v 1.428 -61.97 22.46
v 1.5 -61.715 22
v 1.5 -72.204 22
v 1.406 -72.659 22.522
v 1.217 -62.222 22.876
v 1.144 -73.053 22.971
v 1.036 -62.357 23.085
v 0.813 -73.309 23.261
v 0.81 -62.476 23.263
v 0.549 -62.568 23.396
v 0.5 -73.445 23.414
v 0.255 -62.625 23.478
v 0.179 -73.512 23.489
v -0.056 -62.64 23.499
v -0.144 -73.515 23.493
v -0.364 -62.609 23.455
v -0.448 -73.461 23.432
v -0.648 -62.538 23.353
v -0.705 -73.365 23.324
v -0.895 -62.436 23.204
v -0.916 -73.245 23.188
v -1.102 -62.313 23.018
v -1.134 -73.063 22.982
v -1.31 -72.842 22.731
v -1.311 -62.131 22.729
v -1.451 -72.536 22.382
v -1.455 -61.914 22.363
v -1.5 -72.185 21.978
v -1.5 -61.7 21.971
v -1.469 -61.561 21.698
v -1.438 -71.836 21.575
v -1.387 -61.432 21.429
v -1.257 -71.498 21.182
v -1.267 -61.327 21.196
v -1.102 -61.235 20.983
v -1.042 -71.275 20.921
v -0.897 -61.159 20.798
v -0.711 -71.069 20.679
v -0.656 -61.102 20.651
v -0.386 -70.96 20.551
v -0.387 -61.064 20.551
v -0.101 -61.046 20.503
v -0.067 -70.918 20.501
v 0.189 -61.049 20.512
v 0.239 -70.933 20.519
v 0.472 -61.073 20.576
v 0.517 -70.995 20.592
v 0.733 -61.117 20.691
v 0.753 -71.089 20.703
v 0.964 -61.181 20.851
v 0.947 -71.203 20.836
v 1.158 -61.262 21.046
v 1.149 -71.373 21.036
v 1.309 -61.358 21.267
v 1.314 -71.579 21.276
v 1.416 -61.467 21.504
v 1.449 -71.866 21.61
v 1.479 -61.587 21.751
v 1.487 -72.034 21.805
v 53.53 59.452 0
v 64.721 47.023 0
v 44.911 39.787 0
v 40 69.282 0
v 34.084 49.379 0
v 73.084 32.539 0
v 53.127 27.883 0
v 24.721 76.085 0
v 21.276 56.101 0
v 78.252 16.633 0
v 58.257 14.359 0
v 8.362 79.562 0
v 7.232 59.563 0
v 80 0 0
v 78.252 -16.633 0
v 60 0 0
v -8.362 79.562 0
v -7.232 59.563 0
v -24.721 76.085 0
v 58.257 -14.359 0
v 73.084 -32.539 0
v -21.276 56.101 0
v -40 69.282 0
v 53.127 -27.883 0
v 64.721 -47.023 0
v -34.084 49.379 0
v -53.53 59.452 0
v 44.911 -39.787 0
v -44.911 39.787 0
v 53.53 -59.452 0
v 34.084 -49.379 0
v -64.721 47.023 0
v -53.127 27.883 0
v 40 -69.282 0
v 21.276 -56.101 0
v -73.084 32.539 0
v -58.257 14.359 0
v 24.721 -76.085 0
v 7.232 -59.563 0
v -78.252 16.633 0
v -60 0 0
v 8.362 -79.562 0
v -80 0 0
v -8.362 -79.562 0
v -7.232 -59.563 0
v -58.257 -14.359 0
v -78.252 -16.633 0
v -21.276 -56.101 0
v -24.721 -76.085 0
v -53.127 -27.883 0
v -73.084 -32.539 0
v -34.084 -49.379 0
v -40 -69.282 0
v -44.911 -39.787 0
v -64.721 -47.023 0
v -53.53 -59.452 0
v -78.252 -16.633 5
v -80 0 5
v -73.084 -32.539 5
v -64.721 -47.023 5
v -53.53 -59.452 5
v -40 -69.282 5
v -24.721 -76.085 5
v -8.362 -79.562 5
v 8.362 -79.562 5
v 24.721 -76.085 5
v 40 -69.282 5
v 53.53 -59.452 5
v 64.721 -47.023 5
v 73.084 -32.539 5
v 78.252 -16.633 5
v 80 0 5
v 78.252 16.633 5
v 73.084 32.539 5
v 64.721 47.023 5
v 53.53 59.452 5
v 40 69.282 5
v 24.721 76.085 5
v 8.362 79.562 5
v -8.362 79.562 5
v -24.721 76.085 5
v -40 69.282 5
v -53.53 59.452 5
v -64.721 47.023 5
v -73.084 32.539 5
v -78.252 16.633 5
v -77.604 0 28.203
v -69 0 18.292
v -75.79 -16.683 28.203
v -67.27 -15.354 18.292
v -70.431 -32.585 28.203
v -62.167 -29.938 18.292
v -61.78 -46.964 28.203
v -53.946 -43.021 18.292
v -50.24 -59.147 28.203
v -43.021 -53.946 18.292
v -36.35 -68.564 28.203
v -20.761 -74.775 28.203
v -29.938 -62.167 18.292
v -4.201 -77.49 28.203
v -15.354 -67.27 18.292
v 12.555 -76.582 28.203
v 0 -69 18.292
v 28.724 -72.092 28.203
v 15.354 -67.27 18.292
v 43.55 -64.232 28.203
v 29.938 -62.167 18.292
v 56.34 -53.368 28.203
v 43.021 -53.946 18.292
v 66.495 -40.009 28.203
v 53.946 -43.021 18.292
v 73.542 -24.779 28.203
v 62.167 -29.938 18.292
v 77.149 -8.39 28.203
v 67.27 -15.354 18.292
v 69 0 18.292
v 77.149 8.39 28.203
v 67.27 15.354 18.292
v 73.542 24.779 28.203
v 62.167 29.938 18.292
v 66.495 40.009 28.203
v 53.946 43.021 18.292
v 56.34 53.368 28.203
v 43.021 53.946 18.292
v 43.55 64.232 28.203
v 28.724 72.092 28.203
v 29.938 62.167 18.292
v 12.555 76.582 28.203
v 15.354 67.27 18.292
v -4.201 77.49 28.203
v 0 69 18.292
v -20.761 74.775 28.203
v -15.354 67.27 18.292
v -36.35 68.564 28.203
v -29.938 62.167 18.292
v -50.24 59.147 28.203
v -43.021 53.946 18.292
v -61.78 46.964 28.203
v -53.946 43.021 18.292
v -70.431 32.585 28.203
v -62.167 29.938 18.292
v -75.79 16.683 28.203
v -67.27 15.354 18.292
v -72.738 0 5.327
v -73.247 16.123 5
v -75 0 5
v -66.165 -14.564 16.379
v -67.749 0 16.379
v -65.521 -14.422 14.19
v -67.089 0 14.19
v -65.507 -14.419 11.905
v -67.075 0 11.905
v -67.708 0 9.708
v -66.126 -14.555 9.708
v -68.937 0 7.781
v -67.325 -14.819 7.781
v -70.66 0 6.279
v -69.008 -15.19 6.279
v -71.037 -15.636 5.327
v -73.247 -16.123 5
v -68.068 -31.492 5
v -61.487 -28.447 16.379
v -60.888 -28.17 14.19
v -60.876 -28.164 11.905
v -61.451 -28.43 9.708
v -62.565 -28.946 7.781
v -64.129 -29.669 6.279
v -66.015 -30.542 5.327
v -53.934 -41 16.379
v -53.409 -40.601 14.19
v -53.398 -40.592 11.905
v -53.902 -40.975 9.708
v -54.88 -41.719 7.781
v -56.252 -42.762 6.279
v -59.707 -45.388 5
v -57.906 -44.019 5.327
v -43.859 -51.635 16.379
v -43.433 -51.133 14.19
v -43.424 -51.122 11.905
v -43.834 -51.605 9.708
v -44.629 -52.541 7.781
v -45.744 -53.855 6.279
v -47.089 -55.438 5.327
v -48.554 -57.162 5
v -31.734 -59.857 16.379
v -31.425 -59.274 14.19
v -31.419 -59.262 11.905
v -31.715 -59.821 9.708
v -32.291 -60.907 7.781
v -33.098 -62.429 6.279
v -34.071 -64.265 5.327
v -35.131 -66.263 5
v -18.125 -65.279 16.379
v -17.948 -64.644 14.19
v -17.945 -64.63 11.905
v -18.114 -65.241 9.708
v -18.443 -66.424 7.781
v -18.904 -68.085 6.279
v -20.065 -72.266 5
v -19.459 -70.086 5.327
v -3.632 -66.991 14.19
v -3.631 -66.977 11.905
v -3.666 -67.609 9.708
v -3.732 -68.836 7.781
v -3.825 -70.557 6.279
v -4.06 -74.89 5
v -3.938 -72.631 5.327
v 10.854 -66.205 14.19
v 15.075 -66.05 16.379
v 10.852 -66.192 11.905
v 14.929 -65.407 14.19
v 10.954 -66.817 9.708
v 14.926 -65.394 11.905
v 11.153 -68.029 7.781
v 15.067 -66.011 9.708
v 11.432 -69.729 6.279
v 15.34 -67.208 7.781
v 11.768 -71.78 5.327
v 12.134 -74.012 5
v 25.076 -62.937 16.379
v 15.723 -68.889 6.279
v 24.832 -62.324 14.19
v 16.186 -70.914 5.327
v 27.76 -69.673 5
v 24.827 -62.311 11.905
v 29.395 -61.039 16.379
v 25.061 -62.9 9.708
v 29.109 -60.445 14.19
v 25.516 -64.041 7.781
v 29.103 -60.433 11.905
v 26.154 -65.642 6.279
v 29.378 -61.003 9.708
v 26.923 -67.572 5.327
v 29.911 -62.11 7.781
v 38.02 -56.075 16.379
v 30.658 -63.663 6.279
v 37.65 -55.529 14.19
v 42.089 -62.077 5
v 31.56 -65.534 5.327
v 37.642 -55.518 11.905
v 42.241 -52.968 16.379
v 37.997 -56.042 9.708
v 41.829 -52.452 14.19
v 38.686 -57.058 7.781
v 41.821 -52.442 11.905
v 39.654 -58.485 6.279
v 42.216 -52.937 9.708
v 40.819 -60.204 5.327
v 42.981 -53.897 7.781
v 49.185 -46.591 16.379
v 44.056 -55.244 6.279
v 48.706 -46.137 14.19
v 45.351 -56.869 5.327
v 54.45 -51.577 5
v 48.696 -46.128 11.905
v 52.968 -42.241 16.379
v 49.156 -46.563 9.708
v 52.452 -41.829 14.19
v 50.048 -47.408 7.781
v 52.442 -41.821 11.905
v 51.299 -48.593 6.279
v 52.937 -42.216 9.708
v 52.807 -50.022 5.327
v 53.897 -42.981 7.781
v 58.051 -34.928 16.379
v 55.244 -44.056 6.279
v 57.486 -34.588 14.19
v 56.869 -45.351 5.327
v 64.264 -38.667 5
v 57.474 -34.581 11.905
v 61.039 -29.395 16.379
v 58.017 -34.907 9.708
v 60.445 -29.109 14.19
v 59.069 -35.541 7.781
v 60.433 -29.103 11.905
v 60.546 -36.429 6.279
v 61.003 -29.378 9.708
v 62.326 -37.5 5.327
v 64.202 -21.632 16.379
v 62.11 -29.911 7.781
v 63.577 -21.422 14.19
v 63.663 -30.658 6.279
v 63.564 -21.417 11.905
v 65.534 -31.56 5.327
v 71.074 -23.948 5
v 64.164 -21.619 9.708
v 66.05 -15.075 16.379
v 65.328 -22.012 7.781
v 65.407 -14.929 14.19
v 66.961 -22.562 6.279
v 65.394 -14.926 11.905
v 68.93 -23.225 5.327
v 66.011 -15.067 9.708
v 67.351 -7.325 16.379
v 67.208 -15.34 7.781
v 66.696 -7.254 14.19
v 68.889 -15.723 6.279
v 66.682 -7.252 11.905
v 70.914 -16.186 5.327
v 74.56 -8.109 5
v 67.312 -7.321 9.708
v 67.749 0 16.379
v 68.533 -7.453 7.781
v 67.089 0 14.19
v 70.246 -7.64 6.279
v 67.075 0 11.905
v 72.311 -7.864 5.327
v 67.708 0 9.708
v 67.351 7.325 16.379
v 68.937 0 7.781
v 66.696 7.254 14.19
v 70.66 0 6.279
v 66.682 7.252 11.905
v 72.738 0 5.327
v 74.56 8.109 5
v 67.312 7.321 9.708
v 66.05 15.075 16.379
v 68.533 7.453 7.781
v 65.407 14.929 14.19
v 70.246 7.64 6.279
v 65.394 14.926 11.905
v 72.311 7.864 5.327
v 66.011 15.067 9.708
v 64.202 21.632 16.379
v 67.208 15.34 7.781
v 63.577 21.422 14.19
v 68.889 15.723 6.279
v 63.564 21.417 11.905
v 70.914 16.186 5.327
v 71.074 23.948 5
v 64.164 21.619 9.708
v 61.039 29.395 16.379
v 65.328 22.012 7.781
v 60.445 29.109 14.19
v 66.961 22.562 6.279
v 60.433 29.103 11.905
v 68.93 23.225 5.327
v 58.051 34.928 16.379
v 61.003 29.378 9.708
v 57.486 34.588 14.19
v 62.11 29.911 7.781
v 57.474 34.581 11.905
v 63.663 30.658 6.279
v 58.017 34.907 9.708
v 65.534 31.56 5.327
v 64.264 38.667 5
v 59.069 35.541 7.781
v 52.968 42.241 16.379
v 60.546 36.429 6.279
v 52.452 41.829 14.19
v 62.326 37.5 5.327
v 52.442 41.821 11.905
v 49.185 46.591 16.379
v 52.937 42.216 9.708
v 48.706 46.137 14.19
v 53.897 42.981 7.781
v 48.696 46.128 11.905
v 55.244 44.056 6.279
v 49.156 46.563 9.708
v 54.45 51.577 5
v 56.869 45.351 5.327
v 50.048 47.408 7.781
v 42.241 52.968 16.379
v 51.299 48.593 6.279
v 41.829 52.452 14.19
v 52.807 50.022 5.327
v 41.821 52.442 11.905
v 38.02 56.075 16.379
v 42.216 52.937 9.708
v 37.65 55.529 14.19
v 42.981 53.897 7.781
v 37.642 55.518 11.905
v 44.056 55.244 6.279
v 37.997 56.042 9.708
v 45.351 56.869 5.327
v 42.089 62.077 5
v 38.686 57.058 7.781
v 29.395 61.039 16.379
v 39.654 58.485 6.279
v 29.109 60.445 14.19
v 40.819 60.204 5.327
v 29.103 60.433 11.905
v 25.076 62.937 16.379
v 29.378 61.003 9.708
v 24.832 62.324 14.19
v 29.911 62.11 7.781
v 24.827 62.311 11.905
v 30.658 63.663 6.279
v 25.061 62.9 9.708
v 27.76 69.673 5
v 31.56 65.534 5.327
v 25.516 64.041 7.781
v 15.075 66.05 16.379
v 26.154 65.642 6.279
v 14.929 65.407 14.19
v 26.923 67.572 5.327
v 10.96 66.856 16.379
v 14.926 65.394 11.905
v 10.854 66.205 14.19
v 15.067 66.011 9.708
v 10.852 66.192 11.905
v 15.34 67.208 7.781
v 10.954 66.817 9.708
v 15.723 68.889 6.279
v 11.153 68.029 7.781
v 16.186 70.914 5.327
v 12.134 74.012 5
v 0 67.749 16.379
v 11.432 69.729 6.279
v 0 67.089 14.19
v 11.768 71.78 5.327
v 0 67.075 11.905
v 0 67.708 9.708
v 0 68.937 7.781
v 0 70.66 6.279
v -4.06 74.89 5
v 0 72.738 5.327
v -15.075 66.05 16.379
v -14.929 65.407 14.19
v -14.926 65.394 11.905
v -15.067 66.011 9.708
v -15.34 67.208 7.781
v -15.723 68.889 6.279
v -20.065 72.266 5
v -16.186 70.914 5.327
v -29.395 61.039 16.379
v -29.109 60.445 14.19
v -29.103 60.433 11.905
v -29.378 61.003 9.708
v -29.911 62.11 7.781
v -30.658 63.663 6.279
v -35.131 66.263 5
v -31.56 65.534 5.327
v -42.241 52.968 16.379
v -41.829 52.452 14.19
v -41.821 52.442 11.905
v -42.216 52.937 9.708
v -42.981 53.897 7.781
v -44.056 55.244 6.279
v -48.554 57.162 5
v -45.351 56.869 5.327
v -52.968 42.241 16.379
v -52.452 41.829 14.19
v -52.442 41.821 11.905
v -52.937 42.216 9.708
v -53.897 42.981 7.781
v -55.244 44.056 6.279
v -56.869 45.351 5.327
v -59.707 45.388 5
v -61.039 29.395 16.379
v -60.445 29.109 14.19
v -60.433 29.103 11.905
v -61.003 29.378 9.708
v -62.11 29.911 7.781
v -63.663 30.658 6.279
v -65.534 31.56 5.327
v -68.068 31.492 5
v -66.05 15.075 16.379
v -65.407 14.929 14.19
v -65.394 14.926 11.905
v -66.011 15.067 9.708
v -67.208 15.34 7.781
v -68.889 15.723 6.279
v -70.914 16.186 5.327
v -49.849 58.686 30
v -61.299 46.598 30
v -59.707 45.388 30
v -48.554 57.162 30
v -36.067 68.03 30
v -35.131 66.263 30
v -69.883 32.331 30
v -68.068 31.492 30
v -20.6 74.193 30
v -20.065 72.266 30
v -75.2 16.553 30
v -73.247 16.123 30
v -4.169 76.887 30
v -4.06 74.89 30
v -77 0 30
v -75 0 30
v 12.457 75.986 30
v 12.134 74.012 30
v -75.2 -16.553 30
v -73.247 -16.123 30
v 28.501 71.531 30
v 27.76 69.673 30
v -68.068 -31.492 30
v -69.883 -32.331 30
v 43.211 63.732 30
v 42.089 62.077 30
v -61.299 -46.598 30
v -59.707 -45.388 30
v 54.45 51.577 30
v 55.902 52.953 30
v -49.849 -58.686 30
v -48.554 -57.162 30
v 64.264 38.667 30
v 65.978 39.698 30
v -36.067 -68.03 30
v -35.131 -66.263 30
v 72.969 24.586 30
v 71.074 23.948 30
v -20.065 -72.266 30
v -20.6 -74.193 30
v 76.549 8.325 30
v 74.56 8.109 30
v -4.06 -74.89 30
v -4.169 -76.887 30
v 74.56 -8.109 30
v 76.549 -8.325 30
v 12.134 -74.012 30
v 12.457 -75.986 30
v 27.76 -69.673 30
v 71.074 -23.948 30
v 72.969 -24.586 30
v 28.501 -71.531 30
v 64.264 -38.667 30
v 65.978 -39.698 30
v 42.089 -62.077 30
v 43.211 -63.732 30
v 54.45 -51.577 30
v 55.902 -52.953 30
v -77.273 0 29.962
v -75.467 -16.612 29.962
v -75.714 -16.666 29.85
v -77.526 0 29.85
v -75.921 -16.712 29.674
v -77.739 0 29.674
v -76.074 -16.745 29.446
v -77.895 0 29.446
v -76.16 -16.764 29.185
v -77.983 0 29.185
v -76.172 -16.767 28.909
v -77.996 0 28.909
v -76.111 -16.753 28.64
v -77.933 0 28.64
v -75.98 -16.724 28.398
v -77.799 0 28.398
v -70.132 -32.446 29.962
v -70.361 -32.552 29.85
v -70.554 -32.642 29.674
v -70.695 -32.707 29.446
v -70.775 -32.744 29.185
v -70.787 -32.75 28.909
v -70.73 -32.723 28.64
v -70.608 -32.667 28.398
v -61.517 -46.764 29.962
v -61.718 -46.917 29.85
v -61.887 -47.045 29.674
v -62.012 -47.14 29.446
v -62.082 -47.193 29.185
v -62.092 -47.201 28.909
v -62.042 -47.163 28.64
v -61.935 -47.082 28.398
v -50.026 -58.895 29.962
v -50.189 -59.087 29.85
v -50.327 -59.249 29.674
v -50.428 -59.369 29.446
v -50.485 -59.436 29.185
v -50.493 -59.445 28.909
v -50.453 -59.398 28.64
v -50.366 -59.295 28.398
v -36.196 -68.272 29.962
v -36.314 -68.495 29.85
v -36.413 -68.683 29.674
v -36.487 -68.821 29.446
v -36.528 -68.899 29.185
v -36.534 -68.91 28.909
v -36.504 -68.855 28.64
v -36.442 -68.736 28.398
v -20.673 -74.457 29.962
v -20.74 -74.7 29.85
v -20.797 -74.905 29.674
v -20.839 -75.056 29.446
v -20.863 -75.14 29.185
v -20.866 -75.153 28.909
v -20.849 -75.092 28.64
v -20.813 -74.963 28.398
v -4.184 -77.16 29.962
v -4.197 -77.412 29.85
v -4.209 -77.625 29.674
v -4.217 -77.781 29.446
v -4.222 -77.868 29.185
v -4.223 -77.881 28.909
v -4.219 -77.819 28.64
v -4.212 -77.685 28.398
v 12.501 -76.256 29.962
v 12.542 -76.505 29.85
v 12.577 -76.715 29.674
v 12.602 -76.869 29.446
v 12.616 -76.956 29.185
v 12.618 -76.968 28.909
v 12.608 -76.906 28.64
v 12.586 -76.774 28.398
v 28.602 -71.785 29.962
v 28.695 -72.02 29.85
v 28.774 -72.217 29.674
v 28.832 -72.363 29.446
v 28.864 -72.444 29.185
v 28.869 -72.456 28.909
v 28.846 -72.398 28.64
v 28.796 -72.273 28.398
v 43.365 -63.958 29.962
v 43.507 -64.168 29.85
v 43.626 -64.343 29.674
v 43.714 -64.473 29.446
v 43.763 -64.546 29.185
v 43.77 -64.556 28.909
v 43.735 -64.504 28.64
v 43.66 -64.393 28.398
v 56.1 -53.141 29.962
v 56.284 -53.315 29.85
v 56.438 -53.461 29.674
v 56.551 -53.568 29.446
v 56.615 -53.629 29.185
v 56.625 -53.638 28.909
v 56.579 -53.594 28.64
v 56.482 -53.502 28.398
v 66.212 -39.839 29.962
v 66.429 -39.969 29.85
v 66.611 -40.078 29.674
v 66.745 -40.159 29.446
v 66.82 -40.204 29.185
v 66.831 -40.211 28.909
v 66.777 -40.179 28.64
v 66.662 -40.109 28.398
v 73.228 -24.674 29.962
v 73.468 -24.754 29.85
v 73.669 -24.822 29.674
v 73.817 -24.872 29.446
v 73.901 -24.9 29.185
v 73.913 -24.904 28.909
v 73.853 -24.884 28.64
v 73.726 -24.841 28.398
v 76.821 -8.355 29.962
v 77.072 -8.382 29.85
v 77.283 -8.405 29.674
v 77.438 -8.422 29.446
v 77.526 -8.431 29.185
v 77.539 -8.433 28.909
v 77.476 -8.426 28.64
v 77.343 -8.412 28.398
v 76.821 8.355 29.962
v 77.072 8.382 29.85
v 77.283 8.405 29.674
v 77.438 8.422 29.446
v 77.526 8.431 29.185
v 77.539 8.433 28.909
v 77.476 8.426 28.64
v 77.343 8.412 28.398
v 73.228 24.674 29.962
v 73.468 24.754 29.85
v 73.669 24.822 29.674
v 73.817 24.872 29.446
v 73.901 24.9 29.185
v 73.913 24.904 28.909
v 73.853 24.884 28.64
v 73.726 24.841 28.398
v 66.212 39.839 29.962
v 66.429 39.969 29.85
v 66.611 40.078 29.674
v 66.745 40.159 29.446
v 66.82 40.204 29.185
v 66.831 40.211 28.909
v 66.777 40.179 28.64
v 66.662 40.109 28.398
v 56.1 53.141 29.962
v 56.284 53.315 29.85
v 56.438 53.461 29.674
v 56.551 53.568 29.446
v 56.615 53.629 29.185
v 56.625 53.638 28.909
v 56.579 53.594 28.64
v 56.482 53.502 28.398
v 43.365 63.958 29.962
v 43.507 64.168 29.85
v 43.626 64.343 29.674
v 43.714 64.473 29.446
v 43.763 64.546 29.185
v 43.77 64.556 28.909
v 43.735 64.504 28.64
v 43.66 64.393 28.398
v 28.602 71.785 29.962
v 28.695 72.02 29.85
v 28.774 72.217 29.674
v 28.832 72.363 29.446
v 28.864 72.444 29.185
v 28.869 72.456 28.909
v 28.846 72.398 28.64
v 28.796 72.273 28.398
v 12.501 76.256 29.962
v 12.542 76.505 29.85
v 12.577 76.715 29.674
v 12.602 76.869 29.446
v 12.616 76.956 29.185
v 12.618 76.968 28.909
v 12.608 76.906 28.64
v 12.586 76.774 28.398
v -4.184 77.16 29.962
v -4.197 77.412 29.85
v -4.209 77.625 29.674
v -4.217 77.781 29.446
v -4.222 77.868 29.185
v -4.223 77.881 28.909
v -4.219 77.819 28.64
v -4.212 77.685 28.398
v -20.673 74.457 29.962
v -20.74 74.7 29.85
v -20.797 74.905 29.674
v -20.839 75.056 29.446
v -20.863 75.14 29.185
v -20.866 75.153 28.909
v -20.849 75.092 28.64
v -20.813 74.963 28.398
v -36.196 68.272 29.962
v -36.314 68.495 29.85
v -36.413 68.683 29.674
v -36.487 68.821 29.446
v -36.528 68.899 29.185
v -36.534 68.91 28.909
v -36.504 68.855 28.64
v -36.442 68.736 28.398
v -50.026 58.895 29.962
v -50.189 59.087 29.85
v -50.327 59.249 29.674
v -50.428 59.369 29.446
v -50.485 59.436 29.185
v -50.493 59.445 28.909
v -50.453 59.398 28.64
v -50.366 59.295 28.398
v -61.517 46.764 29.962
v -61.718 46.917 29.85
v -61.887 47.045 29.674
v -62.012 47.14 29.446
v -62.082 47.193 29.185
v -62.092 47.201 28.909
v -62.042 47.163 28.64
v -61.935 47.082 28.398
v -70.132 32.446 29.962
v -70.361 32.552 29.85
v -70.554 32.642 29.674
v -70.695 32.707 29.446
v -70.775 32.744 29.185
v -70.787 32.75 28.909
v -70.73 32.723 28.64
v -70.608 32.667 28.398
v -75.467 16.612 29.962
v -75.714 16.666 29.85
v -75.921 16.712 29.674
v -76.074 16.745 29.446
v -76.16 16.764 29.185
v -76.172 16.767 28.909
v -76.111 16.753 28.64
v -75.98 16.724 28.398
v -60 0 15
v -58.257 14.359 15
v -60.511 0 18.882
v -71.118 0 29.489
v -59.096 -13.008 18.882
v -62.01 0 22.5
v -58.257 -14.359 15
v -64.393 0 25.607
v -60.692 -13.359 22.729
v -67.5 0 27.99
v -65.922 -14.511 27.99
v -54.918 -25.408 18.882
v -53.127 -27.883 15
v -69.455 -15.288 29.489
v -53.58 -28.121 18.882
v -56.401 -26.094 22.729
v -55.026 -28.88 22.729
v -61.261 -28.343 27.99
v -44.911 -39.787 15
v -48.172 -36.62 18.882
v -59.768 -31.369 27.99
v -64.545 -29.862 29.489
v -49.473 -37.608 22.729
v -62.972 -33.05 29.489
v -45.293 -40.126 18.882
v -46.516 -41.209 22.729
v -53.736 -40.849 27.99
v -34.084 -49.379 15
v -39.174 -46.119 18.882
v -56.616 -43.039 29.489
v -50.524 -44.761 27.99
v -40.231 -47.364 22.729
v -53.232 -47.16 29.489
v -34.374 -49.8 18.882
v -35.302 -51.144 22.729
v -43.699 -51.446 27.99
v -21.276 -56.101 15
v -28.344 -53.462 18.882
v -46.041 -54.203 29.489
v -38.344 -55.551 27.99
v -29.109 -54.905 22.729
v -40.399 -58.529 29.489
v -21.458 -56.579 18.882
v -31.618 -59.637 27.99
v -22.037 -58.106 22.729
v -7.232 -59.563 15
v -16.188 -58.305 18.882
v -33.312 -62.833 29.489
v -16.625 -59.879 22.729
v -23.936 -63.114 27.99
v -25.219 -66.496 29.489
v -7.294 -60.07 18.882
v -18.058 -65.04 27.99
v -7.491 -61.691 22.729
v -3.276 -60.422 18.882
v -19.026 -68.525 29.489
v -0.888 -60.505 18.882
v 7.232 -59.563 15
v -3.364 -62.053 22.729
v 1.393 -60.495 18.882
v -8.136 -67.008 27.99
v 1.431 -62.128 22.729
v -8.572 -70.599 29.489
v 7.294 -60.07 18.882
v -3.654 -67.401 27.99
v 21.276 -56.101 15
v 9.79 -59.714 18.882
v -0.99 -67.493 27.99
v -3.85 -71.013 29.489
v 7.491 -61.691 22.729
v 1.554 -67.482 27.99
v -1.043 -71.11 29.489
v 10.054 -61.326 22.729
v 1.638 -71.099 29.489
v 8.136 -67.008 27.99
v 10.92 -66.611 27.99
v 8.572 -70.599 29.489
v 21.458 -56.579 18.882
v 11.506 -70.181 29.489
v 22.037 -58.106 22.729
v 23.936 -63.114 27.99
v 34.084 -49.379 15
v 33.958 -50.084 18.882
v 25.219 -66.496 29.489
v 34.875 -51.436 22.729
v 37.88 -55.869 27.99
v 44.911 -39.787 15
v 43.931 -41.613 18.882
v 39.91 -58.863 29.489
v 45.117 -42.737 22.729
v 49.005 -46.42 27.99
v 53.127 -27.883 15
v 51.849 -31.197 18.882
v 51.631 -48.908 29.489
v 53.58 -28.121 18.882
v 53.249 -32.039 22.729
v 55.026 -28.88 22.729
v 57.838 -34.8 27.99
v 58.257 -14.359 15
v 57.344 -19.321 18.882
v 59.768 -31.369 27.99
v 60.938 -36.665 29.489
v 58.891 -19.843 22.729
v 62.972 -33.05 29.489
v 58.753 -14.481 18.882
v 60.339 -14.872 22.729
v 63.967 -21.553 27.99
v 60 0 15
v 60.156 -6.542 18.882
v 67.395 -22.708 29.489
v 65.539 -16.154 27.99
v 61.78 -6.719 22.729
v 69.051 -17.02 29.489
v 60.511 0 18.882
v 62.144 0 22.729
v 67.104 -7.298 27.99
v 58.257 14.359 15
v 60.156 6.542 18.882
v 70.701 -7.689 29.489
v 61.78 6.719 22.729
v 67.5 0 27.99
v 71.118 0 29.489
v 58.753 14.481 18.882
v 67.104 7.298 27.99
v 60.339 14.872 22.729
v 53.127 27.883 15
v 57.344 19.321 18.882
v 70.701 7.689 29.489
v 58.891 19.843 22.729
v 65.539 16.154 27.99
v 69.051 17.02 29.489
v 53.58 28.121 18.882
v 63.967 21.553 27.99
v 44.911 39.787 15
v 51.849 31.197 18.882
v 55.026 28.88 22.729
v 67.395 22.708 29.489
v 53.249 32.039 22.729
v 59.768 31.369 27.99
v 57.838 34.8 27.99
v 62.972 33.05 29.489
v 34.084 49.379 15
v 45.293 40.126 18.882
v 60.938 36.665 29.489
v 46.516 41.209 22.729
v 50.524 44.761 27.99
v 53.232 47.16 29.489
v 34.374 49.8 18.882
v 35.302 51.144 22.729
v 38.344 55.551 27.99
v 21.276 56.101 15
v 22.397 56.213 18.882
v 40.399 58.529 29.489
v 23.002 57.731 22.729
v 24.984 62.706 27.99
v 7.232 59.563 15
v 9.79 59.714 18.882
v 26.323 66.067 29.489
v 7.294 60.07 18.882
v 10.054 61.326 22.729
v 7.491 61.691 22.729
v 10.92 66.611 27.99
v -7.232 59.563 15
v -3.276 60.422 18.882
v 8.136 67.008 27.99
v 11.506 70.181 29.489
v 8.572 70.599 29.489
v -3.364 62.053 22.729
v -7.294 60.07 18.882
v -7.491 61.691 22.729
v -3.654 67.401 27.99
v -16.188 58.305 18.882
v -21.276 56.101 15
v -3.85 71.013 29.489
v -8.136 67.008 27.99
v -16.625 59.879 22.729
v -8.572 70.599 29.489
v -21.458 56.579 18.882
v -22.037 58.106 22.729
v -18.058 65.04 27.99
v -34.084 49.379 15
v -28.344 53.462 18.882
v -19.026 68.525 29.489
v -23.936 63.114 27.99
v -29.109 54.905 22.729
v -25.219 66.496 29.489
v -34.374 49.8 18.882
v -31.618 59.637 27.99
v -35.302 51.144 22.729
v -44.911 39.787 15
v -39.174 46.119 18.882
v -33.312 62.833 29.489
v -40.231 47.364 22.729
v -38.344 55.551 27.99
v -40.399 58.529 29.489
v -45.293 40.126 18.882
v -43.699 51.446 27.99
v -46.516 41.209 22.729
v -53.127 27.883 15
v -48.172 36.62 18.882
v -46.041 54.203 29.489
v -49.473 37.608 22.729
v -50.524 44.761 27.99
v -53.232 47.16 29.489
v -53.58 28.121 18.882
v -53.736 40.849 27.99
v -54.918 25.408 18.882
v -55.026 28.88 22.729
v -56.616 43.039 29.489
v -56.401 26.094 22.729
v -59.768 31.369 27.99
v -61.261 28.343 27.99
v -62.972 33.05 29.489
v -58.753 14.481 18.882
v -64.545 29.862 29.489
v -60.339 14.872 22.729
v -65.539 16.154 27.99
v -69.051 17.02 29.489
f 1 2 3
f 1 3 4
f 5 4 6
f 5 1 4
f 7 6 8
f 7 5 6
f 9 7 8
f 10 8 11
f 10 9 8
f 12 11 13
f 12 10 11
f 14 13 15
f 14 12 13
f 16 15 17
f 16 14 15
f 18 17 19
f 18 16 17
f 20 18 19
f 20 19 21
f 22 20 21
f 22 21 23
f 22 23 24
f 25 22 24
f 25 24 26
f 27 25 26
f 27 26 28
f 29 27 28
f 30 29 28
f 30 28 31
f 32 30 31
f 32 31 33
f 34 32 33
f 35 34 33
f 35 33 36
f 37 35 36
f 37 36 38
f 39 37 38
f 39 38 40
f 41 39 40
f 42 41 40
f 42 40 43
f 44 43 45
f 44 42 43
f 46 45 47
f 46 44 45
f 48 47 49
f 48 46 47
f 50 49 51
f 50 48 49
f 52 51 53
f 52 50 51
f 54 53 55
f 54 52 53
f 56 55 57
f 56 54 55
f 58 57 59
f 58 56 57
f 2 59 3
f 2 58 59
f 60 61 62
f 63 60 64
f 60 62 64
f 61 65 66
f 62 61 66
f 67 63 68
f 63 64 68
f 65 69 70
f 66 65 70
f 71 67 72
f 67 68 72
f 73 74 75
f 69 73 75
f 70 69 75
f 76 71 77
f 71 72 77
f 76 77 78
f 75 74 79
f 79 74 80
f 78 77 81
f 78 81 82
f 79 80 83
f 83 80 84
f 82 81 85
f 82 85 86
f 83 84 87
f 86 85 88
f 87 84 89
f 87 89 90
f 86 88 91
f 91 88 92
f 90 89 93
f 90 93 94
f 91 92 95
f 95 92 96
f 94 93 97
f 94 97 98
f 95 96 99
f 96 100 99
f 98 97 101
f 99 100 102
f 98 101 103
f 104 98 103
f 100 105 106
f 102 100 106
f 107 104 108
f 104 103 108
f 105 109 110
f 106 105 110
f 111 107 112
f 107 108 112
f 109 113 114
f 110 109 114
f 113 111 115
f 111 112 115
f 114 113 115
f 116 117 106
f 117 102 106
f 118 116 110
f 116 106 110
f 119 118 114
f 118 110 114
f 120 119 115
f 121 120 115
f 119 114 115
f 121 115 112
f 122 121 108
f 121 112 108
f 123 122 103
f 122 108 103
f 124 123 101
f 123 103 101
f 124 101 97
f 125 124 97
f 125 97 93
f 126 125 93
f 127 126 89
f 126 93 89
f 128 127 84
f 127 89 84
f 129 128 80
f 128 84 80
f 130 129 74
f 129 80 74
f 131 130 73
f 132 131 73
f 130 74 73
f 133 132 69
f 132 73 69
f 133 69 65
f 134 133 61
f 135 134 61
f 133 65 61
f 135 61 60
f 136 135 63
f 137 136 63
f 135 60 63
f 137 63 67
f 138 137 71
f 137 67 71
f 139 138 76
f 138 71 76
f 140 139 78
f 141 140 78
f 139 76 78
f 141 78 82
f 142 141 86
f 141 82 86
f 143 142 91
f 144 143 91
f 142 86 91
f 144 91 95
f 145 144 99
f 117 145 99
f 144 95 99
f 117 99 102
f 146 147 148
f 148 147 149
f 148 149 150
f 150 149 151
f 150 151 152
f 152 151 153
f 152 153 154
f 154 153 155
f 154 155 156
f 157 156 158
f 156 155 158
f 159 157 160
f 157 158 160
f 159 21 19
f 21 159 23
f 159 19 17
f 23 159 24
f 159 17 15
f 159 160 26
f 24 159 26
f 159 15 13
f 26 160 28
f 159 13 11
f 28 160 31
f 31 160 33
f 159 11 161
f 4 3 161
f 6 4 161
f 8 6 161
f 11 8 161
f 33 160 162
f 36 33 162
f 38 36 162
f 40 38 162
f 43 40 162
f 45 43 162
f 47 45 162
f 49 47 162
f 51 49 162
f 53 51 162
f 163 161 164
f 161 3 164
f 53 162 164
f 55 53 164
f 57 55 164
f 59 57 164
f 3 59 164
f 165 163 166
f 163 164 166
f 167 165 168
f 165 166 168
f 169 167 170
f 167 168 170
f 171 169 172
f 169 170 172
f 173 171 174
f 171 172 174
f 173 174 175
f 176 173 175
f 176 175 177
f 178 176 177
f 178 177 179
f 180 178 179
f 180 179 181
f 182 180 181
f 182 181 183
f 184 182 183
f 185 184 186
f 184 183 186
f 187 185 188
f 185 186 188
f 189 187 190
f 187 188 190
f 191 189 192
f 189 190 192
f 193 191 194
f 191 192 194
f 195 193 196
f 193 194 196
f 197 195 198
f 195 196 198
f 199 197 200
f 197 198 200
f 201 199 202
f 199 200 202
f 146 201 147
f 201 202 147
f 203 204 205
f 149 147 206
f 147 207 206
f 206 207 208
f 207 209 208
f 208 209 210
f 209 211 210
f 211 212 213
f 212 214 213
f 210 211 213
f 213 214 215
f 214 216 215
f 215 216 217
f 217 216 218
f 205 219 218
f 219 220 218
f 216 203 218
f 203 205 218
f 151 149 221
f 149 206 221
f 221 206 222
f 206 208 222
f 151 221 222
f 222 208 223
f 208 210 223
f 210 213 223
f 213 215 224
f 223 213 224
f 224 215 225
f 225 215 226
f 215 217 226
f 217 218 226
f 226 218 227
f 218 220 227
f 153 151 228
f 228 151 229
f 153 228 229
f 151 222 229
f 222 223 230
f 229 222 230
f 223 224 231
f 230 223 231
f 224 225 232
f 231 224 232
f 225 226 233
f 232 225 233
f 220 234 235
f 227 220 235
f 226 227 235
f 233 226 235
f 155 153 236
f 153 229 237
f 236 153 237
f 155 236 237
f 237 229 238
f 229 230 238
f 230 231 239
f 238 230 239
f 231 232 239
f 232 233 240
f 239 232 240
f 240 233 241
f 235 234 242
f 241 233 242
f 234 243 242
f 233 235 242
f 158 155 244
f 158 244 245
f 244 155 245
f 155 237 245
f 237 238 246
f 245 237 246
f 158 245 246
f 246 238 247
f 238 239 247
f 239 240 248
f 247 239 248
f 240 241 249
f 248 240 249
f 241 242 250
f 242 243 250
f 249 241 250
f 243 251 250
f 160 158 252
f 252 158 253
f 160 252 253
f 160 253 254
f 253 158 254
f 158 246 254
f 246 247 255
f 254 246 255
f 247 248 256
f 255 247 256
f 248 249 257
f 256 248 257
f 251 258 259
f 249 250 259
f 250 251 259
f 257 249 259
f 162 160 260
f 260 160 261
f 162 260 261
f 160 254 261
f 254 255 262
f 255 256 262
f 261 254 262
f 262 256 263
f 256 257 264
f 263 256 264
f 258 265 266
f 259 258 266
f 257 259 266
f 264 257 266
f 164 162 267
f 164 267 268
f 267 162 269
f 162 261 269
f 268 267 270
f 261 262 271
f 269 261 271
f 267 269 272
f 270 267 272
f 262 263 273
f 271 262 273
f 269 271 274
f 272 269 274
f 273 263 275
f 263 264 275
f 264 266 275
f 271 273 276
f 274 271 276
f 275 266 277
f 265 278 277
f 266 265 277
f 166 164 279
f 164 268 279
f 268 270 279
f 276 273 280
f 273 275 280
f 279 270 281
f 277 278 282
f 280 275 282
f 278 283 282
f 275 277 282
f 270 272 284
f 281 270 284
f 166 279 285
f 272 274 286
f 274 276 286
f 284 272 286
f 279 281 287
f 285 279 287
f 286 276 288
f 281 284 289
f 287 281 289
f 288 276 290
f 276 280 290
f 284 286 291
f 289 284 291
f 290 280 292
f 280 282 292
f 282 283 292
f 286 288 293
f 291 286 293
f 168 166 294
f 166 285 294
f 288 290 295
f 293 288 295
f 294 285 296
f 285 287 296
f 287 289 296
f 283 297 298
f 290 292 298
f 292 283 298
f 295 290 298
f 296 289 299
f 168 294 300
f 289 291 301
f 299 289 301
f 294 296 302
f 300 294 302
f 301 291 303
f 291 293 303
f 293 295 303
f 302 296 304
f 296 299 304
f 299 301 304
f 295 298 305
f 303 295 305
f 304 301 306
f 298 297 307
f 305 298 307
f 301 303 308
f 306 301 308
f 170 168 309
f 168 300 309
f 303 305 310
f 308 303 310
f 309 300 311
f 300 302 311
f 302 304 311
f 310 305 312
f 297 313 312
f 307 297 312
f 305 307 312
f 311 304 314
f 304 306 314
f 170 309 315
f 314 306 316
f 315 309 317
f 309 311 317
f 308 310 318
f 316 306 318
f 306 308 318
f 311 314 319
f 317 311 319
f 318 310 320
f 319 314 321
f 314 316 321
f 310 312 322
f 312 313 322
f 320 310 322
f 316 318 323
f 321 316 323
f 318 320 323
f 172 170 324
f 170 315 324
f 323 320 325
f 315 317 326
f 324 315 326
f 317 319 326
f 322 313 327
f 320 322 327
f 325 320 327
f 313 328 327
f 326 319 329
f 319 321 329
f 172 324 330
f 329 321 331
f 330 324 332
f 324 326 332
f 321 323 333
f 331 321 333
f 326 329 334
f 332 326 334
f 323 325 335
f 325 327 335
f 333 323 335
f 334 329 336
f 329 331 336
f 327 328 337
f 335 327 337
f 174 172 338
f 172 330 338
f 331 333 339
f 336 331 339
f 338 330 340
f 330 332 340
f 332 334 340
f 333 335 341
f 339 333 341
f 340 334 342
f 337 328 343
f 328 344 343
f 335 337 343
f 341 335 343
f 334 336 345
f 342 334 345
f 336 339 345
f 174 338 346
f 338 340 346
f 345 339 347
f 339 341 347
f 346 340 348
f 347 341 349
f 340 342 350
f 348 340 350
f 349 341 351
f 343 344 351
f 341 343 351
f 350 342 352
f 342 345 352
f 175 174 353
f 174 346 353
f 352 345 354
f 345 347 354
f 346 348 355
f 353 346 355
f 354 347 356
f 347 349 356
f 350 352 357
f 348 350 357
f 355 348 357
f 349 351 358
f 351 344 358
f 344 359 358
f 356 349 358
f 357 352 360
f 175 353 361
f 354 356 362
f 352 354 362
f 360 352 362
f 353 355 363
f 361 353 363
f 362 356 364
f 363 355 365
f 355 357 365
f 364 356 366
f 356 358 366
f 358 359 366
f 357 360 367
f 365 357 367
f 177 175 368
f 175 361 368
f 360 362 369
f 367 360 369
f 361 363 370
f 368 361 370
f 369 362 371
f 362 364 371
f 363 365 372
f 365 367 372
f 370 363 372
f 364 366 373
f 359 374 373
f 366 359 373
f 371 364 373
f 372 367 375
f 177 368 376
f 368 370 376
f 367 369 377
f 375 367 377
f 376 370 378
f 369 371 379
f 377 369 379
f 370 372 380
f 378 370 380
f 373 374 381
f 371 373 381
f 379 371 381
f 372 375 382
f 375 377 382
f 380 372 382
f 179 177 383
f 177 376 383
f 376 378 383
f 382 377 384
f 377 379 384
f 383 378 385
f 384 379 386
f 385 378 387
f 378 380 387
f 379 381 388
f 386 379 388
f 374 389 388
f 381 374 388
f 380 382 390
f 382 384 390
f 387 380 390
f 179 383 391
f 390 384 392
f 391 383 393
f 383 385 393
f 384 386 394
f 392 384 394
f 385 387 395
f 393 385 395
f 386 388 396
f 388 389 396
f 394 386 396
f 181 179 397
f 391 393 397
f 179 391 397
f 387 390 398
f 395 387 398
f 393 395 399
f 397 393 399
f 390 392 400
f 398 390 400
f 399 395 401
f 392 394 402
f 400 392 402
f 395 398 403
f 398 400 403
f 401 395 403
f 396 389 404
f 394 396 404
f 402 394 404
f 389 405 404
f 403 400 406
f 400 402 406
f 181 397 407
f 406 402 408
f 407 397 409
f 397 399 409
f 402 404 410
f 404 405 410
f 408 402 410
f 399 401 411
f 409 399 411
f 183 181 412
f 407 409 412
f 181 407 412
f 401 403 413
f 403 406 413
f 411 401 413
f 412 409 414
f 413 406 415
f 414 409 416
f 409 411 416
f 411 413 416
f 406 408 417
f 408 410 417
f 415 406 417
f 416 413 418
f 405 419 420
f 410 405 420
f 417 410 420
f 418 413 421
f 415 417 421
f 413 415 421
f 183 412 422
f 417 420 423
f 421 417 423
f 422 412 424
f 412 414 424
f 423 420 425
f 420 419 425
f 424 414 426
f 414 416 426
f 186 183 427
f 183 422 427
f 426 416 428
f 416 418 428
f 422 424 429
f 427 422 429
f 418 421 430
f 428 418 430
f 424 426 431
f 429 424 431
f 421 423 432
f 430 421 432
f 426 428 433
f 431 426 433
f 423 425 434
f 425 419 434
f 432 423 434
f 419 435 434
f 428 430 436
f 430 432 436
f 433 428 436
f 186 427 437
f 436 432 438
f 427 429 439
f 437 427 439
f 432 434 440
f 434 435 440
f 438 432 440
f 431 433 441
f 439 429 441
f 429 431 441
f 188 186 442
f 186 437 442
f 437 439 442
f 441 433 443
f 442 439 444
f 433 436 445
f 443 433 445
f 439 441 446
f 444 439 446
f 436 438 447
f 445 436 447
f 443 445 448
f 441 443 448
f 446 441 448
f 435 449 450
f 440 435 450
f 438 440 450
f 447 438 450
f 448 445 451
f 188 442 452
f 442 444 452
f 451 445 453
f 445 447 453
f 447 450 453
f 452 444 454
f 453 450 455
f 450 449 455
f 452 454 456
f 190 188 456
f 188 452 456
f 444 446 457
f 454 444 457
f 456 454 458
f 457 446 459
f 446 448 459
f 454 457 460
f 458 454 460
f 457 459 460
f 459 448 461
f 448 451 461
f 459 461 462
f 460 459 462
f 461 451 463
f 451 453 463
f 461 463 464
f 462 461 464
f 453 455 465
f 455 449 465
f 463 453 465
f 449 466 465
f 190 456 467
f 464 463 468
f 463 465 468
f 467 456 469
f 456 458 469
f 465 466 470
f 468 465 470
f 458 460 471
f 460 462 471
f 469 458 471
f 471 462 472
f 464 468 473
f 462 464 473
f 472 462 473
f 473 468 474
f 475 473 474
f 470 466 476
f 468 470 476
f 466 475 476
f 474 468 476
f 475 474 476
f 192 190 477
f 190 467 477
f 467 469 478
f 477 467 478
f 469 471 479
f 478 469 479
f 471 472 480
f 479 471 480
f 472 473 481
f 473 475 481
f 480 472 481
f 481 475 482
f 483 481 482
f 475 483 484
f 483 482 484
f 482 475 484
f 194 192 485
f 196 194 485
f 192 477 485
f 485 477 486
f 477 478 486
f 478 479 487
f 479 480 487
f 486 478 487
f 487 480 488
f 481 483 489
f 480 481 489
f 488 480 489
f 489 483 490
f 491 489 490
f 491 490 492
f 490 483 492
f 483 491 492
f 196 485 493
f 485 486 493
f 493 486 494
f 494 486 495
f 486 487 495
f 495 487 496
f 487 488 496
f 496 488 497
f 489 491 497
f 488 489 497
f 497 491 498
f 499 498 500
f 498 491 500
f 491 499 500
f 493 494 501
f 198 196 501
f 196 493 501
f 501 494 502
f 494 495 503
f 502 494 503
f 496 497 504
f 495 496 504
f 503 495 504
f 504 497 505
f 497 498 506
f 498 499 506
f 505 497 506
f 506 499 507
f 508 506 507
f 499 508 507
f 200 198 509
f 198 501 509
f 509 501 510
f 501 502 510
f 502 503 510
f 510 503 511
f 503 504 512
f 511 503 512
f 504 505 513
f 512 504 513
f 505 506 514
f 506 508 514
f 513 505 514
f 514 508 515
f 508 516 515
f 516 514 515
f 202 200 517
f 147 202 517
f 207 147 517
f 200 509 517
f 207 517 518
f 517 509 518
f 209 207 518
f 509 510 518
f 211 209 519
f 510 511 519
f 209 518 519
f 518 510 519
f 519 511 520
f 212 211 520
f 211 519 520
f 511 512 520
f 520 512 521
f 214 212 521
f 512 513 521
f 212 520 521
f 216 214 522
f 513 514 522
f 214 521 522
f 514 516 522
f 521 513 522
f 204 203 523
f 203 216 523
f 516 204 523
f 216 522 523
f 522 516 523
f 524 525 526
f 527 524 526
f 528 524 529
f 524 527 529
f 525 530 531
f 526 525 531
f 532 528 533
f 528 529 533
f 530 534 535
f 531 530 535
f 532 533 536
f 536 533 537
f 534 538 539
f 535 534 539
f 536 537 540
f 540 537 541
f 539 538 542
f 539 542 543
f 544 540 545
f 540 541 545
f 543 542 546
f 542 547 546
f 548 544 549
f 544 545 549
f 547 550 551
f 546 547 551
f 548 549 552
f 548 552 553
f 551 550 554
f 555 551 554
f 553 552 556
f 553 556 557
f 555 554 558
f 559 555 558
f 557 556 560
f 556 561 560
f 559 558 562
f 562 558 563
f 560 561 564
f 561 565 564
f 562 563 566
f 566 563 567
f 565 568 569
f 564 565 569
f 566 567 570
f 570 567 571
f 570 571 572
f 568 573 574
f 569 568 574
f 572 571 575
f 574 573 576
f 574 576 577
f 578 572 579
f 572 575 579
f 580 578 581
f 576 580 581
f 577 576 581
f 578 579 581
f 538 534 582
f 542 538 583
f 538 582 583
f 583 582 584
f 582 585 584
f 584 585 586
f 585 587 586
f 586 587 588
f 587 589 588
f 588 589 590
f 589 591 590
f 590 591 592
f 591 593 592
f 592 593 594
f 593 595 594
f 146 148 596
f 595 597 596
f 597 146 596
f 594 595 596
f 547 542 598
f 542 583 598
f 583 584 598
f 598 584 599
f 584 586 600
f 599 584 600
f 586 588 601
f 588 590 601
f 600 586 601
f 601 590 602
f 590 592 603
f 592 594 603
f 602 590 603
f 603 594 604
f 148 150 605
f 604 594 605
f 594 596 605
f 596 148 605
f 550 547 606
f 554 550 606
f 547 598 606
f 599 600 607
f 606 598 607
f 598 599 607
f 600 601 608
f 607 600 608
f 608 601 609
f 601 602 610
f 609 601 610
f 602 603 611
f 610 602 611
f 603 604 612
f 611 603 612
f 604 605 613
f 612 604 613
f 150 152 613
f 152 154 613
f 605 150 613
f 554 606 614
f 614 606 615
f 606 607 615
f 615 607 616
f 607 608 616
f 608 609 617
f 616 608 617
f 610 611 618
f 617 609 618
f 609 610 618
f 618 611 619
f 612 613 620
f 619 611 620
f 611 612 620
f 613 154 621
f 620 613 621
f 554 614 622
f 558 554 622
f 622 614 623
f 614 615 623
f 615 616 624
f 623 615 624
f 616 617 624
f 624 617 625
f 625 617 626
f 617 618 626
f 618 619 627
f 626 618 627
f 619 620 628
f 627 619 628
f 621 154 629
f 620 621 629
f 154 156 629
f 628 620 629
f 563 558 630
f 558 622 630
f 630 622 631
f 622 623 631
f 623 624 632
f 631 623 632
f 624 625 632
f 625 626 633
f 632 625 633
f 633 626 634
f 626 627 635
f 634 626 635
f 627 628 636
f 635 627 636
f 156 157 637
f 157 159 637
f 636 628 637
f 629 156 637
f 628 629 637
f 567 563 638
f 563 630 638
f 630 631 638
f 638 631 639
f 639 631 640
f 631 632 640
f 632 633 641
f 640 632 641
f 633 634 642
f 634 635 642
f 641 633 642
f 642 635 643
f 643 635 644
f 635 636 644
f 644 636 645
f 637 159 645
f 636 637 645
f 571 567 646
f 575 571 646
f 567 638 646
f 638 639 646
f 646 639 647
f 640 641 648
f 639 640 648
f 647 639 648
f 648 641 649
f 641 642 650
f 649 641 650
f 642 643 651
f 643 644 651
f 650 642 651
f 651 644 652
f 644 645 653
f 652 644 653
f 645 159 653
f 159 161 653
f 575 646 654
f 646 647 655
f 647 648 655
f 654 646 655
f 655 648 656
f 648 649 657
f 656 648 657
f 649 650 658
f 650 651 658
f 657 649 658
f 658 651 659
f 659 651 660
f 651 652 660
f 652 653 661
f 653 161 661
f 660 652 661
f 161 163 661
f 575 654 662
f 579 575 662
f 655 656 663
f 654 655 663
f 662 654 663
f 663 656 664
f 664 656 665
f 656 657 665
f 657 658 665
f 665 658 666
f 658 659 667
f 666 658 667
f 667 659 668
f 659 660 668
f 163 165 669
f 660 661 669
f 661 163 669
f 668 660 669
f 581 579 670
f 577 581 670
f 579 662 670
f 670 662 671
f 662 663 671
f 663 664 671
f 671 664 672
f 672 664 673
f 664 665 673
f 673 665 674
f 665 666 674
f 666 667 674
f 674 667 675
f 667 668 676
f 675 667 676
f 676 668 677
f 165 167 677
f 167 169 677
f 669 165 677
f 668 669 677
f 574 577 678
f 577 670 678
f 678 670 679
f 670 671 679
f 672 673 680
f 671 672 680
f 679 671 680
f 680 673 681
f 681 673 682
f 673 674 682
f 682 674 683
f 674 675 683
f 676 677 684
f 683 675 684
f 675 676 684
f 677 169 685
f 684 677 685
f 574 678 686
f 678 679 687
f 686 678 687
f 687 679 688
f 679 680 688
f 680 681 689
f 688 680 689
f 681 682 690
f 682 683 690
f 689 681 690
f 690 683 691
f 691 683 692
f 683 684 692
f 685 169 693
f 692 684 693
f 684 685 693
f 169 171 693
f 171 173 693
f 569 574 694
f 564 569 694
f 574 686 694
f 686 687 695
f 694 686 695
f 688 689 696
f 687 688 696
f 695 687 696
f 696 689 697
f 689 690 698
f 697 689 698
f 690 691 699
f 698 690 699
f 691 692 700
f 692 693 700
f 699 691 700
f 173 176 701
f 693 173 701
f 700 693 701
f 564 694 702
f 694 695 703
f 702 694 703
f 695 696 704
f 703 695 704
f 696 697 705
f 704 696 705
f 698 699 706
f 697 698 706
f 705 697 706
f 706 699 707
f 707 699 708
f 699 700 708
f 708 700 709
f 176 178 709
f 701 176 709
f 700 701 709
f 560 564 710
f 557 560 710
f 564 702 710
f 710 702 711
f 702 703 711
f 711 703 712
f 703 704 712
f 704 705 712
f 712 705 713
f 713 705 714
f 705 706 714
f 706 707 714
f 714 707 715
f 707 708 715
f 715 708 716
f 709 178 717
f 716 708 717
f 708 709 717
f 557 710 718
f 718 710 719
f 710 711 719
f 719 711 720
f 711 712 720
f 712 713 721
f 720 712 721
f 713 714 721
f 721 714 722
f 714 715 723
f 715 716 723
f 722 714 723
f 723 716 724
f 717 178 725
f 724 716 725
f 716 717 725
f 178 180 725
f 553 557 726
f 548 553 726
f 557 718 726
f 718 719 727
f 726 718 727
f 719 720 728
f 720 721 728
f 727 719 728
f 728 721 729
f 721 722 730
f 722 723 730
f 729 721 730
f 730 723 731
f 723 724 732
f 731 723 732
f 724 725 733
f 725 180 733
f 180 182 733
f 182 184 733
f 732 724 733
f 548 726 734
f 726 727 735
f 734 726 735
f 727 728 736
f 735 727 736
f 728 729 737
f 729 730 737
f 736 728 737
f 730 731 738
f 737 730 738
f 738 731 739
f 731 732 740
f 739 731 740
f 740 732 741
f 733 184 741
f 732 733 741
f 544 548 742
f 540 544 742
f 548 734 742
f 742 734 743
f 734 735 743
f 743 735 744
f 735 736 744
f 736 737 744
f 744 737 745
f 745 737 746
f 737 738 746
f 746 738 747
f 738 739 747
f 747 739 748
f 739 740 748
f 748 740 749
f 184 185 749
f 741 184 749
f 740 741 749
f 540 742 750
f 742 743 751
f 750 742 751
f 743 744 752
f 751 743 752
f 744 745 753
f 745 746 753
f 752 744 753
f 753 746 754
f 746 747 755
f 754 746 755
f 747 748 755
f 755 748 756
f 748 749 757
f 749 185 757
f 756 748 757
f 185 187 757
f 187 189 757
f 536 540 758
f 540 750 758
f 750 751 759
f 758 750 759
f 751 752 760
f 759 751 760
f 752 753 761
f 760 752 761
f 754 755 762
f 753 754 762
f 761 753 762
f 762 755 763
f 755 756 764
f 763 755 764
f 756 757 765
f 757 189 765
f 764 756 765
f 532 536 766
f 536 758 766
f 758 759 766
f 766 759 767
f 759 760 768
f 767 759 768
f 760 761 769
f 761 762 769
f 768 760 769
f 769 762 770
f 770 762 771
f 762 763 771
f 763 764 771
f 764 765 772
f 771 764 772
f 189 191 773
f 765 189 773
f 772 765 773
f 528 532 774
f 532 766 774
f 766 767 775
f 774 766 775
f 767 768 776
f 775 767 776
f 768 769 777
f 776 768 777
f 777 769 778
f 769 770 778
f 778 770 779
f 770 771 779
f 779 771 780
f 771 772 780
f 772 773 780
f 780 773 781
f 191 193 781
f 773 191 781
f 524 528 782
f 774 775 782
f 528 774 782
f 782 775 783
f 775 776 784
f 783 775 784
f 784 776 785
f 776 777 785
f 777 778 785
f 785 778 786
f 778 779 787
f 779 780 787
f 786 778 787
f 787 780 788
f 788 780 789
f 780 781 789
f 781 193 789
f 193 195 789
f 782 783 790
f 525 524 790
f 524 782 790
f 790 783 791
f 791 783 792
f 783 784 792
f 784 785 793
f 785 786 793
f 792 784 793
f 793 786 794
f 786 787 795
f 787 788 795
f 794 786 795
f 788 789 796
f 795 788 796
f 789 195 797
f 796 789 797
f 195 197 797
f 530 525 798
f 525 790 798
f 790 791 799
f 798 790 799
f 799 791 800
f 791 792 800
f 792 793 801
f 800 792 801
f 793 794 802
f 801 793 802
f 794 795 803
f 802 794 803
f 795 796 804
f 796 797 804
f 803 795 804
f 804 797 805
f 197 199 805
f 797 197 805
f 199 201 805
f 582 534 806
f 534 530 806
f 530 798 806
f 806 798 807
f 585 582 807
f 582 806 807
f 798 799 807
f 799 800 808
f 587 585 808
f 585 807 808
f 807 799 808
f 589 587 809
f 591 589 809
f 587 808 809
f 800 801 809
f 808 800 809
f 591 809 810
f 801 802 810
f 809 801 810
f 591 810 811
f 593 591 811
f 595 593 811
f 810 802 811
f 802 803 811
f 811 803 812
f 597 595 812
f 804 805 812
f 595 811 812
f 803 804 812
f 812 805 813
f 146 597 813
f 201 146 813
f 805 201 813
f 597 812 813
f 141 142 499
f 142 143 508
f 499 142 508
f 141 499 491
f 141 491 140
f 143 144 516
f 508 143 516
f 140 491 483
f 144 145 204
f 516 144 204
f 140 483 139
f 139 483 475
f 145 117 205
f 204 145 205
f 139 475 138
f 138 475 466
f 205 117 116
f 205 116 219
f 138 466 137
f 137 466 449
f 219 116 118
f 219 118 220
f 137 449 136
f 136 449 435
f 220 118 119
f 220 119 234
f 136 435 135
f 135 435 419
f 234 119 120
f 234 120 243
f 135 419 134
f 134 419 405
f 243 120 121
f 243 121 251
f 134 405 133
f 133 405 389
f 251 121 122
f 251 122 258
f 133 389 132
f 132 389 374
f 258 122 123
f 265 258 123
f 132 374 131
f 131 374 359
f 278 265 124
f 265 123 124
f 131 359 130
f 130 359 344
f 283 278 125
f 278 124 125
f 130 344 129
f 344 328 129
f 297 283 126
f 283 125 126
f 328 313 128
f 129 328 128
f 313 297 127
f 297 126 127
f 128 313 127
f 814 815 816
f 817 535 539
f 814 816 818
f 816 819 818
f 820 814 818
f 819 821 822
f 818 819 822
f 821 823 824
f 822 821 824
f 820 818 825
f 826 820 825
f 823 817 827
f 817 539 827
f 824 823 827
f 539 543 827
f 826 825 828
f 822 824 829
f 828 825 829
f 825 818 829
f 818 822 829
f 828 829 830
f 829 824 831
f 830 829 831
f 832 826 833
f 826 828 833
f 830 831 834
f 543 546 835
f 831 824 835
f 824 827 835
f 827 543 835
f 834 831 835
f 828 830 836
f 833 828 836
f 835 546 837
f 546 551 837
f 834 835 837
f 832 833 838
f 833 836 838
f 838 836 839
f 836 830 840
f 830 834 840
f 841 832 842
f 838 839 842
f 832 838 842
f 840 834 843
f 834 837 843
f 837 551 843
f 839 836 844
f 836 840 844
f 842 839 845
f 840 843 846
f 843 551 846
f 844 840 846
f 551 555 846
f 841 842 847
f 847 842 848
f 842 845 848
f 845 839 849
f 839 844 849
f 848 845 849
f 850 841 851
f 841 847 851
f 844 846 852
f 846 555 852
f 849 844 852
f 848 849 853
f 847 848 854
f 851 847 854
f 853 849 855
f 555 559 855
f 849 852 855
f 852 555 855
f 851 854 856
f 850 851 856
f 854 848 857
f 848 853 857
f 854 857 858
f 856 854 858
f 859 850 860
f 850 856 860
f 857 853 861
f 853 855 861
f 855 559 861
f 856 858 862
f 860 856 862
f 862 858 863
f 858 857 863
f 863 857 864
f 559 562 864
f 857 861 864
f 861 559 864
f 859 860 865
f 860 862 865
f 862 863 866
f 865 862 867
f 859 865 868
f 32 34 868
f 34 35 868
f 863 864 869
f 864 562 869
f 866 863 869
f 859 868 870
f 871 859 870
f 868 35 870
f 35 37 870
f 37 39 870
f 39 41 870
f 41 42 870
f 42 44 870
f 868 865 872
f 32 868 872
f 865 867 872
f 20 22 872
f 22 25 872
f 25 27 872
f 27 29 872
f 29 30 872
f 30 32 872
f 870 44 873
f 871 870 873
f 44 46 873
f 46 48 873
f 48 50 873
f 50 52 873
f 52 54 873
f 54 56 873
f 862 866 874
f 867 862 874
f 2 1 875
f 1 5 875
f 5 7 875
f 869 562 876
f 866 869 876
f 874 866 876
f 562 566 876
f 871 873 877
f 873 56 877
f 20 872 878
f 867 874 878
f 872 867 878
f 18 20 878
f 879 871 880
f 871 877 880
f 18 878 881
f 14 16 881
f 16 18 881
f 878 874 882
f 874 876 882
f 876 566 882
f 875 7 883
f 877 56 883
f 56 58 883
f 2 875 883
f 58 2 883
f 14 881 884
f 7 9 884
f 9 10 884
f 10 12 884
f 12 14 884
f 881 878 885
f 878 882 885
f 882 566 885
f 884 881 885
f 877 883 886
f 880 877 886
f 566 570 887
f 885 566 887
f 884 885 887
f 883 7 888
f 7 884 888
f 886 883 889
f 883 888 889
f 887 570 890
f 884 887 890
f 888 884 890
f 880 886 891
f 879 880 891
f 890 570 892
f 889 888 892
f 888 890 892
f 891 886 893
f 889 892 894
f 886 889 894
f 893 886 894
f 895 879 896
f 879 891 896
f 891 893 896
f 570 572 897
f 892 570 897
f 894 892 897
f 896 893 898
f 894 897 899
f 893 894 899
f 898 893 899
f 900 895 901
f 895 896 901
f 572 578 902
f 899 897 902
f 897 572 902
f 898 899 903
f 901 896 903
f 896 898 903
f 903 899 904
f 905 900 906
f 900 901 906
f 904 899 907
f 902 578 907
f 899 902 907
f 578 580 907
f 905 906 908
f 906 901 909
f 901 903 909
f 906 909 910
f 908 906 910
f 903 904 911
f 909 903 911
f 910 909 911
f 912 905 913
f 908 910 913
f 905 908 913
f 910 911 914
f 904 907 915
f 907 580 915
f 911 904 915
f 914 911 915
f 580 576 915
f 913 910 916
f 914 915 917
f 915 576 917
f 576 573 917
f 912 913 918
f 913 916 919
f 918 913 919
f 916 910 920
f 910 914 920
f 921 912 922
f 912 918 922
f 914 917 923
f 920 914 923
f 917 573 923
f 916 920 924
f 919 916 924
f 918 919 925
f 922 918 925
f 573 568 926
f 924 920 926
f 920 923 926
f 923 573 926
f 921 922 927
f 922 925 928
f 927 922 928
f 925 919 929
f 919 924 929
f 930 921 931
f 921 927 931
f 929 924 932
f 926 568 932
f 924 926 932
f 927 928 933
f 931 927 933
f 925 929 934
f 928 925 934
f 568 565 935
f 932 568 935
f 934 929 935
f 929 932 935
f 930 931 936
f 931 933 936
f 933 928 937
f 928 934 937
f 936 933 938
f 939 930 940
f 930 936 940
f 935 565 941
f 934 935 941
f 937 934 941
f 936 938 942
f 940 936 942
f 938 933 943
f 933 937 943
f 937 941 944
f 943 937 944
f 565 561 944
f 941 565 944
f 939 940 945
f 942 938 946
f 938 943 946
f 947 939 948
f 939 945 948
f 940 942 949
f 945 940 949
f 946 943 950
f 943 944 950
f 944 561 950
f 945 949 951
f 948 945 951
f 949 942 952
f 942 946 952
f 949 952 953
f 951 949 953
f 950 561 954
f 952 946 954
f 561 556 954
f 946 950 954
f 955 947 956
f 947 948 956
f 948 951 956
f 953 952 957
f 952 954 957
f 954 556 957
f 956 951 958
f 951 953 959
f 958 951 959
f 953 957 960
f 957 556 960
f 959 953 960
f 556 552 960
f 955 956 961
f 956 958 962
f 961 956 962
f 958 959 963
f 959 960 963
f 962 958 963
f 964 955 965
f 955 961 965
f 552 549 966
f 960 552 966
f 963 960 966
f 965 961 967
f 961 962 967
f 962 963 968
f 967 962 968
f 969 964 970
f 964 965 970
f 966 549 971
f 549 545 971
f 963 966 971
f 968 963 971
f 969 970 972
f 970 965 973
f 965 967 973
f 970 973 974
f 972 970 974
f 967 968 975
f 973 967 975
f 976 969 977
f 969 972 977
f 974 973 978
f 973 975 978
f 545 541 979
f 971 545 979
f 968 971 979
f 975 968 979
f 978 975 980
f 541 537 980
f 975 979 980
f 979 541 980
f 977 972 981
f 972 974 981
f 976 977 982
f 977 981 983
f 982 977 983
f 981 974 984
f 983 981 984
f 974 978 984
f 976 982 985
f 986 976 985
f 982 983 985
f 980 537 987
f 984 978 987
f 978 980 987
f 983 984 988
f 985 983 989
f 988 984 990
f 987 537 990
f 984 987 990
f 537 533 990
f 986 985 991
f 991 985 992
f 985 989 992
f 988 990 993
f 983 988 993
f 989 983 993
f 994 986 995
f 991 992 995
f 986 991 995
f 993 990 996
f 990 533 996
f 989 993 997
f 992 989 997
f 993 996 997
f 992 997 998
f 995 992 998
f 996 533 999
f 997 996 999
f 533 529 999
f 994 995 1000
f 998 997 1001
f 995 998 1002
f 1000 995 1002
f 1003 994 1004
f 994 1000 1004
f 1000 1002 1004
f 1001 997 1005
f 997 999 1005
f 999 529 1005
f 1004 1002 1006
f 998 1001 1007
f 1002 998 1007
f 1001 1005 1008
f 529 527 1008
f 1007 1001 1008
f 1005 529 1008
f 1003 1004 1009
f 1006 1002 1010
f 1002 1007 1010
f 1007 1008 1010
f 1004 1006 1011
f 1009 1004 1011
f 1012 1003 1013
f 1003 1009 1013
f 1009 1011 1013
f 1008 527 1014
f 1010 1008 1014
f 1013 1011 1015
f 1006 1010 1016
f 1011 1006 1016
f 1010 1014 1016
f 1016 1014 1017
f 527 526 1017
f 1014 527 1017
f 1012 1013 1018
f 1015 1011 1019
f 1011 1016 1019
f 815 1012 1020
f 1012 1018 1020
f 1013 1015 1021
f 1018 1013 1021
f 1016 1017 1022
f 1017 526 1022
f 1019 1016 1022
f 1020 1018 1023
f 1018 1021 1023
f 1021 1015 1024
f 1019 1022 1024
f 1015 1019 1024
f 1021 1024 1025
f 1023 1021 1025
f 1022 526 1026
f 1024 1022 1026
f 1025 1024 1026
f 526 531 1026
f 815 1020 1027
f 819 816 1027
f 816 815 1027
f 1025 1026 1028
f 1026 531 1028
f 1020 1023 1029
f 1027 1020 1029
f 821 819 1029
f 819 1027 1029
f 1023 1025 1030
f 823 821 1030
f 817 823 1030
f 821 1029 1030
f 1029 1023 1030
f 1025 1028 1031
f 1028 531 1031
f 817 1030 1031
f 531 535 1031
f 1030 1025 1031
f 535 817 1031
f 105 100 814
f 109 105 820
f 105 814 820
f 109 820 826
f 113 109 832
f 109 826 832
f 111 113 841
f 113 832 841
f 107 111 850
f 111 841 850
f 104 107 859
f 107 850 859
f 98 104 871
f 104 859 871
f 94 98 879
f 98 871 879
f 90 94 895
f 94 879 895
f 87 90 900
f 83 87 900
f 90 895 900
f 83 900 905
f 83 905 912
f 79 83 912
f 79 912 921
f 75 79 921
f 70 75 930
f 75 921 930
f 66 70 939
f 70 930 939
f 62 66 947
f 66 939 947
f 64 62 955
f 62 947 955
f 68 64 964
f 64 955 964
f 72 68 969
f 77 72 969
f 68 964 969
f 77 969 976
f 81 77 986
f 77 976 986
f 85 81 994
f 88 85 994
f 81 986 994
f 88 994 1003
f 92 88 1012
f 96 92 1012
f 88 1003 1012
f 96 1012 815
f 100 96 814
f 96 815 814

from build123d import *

# Parameters (mm, degrees)
F3_R     = 1.5
F4_DEPTH = 80.001


with BuildPart() as f2:
    # F0 (on Front) → F2 (revolve)
    with BuildSketch(Plane.XZ):
        with BuildLine():
            Line((-80, 5), (-80, 0))
            Line((-80, 0), (-60, 0))
            Line((-60, 0), (-60, 15))
            ThreePointArc((-60, 15), (-64.393398, 25.606602), (-75, 30))
            Line((-75, 30), (-77, 30))
            ThreePointArc((-77, 30), (-77.947917, 29.318518), (-77.603858, 28.202908))
            Line((-77.603858, 28.202908), (-69, 18.291503))
            ThreePointArc((-69, 18.291503), (-67.708497, 9.708497), (-75, 5))
            Line((-75, 5), (-80, 5))
        make_face()
    revolve(axis=Axis((0, 0, 28.539639), (0, 0, 1)))

    # F3 (on Front) → F4 (cut, through all)
    with BuildSketch(Plane.XZ):
        with Locations((0, 22)):
            Circle(F3_R)
    extrude(amount=F4_DEPTH, mode=Mode.SUBTRACT)


solid = f2.part
